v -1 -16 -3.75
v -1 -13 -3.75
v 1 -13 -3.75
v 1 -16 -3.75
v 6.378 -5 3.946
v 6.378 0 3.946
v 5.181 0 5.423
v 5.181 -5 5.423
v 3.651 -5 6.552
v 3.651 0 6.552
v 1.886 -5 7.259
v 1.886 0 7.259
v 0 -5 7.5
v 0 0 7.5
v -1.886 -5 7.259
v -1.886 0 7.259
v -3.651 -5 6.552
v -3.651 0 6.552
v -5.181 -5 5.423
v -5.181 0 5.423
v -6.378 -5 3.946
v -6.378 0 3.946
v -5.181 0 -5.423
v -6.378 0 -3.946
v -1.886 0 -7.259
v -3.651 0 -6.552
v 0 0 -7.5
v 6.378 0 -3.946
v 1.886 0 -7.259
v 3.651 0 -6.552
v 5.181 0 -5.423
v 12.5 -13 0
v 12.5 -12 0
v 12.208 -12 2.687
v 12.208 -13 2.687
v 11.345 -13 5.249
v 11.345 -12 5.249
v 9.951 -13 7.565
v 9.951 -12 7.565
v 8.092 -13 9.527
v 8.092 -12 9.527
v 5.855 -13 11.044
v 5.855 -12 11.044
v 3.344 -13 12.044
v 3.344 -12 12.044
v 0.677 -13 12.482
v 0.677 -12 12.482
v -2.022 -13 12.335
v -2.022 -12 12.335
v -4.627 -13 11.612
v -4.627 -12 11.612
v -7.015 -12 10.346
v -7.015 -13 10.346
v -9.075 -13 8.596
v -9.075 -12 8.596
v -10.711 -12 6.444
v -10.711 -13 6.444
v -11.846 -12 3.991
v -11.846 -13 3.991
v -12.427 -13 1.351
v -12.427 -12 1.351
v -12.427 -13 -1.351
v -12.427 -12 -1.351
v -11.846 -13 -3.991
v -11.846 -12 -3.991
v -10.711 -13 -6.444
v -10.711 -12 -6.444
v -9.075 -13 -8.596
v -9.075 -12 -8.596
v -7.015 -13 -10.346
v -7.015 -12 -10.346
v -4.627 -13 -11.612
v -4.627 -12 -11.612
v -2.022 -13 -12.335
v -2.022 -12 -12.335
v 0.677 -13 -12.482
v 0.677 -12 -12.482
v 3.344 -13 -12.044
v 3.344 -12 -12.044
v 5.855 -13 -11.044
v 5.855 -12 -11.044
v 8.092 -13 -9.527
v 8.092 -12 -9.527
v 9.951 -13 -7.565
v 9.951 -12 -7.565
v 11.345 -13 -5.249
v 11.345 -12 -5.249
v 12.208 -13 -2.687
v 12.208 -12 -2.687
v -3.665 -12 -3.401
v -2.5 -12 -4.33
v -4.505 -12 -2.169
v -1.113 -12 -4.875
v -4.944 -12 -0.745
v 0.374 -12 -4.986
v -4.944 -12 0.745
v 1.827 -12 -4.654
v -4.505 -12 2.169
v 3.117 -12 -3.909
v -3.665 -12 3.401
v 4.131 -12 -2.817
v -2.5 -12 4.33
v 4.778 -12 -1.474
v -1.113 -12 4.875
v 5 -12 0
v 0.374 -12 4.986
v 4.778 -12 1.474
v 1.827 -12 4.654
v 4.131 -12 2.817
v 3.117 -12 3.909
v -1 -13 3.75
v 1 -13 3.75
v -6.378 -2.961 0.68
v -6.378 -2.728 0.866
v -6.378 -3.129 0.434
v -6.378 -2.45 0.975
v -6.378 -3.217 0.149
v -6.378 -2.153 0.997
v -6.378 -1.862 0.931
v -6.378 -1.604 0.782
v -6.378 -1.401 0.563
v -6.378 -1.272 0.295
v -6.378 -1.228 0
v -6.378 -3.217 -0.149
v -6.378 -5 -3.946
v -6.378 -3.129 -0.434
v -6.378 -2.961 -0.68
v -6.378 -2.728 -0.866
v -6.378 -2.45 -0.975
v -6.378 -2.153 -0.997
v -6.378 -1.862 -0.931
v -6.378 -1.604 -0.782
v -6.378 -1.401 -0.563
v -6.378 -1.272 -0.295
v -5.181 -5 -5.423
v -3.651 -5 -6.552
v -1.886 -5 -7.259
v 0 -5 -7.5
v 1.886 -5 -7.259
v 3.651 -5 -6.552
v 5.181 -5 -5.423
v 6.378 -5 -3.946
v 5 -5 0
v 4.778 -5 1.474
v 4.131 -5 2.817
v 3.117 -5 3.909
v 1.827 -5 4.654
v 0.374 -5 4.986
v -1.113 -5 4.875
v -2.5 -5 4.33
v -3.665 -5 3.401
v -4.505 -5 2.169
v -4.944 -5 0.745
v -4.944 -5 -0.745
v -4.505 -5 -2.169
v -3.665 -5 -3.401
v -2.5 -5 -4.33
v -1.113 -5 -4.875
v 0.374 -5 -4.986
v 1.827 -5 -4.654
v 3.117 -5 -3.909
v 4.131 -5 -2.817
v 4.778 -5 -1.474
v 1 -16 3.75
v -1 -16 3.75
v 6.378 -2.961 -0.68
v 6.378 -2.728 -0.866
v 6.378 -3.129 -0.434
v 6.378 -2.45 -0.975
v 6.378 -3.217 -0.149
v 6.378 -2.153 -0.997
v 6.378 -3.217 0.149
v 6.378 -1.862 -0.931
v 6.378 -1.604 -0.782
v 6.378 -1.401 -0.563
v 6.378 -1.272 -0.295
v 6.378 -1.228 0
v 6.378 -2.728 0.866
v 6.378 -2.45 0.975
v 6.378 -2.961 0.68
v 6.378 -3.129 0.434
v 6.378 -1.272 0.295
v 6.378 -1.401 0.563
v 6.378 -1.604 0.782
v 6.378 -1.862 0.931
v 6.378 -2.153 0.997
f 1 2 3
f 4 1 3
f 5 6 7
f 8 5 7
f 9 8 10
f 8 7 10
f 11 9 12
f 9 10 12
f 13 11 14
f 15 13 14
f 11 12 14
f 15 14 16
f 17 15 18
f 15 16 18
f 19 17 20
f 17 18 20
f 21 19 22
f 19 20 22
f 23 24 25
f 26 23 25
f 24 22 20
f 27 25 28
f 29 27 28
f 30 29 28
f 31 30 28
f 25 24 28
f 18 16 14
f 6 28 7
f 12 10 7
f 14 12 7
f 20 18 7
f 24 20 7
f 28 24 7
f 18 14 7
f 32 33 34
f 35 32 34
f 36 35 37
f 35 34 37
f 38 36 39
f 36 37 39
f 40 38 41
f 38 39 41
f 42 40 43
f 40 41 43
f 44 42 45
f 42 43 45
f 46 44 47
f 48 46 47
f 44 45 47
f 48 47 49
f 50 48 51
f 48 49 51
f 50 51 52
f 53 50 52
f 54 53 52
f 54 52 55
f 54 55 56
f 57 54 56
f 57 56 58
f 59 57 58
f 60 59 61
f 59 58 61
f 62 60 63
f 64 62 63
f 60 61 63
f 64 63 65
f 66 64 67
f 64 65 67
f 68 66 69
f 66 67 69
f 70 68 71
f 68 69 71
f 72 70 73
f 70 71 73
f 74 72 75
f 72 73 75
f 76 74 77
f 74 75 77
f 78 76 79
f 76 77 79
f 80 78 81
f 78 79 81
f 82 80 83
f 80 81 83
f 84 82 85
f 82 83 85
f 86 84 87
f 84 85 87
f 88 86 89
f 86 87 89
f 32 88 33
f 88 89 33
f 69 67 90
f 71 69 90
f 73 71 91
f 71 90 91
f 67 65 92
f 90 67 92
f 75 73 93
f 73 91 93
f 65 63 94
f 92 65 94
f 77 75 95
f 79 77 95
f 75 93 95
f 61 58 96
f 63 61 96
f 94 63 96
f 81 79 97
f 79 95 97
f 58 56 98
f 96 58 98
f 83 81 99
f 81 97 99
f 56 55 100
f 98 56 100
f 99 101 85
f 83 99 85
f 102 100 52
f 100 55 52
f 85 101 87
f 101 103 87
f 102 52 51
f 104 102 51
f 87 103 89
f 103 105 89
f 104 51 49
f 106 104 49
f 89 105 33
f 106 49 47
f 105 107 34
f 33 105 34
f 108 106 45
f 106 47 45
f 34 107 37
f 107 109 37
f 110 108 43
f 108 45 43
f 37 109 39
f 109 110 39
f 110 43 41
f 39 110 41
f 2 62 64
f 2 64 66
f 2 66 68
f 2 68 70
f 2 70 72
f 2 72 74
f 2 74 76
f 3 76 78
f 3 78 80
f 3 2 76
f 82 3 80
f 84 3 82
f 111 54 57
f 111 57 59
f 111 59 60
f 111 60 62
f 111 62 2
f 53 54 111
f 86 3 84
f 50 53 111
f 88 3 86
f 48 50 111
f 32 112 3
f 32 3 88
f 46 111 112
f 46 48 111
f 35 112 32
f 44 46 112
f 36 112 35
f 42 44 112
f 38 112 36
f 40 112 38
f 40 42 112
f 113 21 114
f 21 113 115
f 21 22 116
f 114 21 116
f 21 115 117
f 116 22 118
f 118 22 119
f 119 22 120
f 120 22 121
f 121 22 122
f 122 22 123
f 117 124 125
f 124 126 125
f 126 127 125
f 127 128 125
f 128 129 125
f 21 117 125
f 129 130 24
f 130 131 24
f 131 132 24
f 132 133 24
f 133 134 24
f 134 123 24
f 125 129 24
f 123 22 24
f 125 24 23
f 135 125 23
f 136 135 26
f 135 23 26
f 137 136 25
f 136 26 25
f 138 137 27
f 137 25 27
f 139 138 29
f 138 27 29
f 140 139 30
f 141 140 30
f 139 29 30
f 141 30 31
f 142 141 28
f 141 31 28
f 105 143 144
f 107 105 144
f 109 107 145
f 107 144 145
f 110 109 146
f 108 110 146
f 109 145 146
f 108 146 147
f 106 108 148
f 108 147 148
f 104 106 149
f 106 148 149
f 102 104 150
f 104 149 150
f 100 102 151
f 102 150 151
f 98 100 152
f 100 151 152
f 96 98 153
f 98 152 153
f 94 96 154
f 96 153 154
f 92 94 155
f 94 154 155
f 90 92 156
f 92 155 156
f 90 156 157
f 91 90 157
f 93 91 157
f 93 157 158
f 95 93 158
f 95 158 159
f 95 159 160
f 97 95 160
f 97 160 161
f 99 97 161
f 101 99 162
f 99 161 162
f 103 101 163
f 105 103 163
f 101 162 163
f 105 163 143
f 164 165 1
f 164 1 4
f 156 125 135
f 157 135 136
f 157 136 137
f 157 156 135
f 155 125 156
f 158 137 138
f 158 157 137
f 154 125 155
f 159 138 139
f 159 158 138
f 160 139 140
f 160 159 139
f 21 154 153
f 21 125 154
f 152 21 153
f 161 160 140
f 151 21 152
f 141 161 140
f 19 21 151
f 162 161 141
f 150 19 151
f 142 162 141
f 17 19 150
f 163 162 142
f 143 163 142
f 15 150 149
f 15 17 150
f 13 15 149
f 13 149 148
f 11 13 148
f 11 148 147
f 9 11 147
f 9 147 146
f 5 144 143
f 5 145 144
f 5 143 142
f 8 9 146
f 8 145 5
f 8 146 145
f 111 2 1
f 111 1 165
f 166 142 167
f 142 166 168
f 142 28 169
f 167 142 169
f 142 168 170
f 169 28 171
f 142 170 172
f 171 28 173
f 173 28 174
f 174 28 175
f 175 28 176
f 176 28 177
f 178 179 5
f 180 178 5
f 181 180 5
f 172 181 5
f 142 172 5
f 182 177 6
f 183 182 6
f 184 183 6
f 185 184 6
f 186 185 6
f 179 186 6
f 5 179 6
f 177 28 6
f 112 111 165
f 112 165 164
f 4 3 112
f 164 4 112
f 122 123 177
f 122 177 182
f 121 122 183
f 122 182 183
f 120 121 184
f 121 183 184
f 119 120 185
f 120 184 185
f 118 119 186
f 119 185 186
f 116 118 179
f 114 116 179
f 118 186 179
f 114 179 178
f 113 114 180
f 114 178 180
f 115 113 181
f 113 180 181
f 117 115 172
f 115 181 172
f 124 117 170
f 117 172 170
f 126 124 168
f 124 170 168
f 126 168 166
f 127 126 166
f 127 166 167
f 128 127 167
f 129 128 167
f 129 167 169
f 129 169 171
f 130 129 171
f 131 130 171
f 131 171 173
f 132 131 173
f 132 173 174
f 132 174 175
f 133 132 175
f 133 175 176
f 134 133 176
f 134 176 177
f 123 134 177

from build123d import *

# Parameters (mm, degrees)
F0_R      = 7.5
F1_DEPTH  = 5
F2_R      = 5
F3_DEPTH  = 7
F4_R      = 12.5
F5_DEPTH  = 1
F6_W      = 2
F6_H      = 7.5
F7_DEPTH  = 3
F9_DEPTH  = 5
F10_R     = 1
F11_DEPTH = 25


with BuildPart() as f1:
    # F0 (on Front) → F1 (new body)
    with BuildSketch(Plane.XZ):
        Circle(F0_R)
    extrude(amount=F1_DEPTH)

    # F2 (on face) → F3 (join)
    with BuildSketch(Plane.XZ.offset(5)):
        Circle(F2_R)
    extrude(amount=F3_DEPTH)

    # F4 (on face) → F5 (join)
    with BuildSketch(Plane.XZ.offset(12)):
        Circle(F4_R)
    extrude(amount=F5_DEPTH)

    # F6 (on face) → F7 (join)
    with BuildSketch(Plane.XZ.offset(13)):
        Rectangle(F6_W, F6_H)
    extrude(amount=F7_DEPTH)

    # F8 (on face) → F9 (cut)
    with BuildSketch(Plane(origin=(0, 0, 0), x_dir=(-1, 0, 0), z_dir=(0, 1, 0))):
        with BuildLine():
            Line((-6.377801, -3.946347), (-6.377801, 3.946347))
            ThreePointArc((-6.377801, 3.946347), (-7.5, 0), (-6.377801, -3.946347))
        make_face()
        with BuildLine():
            ThreePointArc((6.377801, -3.946347), (7.5, 0), (6.377801, 3.946347))
            Line((6.377801, 3.946347), (6.377801, -3.946347))
        make_face()
    extrude(amount=-F9_DEPTH, mode=Mode.SUBTRACT)

    # F10 (on face) → F11 (cut)
    with BuildSketch(Plane.YZ.offset(6.377801)):
        with Locations((-2.22767, 0)):
            Circle(F10_R)
    extrude(amount=-F11_DEPTH, mode=Mode.SUBTRACT)


solid = f1.part
